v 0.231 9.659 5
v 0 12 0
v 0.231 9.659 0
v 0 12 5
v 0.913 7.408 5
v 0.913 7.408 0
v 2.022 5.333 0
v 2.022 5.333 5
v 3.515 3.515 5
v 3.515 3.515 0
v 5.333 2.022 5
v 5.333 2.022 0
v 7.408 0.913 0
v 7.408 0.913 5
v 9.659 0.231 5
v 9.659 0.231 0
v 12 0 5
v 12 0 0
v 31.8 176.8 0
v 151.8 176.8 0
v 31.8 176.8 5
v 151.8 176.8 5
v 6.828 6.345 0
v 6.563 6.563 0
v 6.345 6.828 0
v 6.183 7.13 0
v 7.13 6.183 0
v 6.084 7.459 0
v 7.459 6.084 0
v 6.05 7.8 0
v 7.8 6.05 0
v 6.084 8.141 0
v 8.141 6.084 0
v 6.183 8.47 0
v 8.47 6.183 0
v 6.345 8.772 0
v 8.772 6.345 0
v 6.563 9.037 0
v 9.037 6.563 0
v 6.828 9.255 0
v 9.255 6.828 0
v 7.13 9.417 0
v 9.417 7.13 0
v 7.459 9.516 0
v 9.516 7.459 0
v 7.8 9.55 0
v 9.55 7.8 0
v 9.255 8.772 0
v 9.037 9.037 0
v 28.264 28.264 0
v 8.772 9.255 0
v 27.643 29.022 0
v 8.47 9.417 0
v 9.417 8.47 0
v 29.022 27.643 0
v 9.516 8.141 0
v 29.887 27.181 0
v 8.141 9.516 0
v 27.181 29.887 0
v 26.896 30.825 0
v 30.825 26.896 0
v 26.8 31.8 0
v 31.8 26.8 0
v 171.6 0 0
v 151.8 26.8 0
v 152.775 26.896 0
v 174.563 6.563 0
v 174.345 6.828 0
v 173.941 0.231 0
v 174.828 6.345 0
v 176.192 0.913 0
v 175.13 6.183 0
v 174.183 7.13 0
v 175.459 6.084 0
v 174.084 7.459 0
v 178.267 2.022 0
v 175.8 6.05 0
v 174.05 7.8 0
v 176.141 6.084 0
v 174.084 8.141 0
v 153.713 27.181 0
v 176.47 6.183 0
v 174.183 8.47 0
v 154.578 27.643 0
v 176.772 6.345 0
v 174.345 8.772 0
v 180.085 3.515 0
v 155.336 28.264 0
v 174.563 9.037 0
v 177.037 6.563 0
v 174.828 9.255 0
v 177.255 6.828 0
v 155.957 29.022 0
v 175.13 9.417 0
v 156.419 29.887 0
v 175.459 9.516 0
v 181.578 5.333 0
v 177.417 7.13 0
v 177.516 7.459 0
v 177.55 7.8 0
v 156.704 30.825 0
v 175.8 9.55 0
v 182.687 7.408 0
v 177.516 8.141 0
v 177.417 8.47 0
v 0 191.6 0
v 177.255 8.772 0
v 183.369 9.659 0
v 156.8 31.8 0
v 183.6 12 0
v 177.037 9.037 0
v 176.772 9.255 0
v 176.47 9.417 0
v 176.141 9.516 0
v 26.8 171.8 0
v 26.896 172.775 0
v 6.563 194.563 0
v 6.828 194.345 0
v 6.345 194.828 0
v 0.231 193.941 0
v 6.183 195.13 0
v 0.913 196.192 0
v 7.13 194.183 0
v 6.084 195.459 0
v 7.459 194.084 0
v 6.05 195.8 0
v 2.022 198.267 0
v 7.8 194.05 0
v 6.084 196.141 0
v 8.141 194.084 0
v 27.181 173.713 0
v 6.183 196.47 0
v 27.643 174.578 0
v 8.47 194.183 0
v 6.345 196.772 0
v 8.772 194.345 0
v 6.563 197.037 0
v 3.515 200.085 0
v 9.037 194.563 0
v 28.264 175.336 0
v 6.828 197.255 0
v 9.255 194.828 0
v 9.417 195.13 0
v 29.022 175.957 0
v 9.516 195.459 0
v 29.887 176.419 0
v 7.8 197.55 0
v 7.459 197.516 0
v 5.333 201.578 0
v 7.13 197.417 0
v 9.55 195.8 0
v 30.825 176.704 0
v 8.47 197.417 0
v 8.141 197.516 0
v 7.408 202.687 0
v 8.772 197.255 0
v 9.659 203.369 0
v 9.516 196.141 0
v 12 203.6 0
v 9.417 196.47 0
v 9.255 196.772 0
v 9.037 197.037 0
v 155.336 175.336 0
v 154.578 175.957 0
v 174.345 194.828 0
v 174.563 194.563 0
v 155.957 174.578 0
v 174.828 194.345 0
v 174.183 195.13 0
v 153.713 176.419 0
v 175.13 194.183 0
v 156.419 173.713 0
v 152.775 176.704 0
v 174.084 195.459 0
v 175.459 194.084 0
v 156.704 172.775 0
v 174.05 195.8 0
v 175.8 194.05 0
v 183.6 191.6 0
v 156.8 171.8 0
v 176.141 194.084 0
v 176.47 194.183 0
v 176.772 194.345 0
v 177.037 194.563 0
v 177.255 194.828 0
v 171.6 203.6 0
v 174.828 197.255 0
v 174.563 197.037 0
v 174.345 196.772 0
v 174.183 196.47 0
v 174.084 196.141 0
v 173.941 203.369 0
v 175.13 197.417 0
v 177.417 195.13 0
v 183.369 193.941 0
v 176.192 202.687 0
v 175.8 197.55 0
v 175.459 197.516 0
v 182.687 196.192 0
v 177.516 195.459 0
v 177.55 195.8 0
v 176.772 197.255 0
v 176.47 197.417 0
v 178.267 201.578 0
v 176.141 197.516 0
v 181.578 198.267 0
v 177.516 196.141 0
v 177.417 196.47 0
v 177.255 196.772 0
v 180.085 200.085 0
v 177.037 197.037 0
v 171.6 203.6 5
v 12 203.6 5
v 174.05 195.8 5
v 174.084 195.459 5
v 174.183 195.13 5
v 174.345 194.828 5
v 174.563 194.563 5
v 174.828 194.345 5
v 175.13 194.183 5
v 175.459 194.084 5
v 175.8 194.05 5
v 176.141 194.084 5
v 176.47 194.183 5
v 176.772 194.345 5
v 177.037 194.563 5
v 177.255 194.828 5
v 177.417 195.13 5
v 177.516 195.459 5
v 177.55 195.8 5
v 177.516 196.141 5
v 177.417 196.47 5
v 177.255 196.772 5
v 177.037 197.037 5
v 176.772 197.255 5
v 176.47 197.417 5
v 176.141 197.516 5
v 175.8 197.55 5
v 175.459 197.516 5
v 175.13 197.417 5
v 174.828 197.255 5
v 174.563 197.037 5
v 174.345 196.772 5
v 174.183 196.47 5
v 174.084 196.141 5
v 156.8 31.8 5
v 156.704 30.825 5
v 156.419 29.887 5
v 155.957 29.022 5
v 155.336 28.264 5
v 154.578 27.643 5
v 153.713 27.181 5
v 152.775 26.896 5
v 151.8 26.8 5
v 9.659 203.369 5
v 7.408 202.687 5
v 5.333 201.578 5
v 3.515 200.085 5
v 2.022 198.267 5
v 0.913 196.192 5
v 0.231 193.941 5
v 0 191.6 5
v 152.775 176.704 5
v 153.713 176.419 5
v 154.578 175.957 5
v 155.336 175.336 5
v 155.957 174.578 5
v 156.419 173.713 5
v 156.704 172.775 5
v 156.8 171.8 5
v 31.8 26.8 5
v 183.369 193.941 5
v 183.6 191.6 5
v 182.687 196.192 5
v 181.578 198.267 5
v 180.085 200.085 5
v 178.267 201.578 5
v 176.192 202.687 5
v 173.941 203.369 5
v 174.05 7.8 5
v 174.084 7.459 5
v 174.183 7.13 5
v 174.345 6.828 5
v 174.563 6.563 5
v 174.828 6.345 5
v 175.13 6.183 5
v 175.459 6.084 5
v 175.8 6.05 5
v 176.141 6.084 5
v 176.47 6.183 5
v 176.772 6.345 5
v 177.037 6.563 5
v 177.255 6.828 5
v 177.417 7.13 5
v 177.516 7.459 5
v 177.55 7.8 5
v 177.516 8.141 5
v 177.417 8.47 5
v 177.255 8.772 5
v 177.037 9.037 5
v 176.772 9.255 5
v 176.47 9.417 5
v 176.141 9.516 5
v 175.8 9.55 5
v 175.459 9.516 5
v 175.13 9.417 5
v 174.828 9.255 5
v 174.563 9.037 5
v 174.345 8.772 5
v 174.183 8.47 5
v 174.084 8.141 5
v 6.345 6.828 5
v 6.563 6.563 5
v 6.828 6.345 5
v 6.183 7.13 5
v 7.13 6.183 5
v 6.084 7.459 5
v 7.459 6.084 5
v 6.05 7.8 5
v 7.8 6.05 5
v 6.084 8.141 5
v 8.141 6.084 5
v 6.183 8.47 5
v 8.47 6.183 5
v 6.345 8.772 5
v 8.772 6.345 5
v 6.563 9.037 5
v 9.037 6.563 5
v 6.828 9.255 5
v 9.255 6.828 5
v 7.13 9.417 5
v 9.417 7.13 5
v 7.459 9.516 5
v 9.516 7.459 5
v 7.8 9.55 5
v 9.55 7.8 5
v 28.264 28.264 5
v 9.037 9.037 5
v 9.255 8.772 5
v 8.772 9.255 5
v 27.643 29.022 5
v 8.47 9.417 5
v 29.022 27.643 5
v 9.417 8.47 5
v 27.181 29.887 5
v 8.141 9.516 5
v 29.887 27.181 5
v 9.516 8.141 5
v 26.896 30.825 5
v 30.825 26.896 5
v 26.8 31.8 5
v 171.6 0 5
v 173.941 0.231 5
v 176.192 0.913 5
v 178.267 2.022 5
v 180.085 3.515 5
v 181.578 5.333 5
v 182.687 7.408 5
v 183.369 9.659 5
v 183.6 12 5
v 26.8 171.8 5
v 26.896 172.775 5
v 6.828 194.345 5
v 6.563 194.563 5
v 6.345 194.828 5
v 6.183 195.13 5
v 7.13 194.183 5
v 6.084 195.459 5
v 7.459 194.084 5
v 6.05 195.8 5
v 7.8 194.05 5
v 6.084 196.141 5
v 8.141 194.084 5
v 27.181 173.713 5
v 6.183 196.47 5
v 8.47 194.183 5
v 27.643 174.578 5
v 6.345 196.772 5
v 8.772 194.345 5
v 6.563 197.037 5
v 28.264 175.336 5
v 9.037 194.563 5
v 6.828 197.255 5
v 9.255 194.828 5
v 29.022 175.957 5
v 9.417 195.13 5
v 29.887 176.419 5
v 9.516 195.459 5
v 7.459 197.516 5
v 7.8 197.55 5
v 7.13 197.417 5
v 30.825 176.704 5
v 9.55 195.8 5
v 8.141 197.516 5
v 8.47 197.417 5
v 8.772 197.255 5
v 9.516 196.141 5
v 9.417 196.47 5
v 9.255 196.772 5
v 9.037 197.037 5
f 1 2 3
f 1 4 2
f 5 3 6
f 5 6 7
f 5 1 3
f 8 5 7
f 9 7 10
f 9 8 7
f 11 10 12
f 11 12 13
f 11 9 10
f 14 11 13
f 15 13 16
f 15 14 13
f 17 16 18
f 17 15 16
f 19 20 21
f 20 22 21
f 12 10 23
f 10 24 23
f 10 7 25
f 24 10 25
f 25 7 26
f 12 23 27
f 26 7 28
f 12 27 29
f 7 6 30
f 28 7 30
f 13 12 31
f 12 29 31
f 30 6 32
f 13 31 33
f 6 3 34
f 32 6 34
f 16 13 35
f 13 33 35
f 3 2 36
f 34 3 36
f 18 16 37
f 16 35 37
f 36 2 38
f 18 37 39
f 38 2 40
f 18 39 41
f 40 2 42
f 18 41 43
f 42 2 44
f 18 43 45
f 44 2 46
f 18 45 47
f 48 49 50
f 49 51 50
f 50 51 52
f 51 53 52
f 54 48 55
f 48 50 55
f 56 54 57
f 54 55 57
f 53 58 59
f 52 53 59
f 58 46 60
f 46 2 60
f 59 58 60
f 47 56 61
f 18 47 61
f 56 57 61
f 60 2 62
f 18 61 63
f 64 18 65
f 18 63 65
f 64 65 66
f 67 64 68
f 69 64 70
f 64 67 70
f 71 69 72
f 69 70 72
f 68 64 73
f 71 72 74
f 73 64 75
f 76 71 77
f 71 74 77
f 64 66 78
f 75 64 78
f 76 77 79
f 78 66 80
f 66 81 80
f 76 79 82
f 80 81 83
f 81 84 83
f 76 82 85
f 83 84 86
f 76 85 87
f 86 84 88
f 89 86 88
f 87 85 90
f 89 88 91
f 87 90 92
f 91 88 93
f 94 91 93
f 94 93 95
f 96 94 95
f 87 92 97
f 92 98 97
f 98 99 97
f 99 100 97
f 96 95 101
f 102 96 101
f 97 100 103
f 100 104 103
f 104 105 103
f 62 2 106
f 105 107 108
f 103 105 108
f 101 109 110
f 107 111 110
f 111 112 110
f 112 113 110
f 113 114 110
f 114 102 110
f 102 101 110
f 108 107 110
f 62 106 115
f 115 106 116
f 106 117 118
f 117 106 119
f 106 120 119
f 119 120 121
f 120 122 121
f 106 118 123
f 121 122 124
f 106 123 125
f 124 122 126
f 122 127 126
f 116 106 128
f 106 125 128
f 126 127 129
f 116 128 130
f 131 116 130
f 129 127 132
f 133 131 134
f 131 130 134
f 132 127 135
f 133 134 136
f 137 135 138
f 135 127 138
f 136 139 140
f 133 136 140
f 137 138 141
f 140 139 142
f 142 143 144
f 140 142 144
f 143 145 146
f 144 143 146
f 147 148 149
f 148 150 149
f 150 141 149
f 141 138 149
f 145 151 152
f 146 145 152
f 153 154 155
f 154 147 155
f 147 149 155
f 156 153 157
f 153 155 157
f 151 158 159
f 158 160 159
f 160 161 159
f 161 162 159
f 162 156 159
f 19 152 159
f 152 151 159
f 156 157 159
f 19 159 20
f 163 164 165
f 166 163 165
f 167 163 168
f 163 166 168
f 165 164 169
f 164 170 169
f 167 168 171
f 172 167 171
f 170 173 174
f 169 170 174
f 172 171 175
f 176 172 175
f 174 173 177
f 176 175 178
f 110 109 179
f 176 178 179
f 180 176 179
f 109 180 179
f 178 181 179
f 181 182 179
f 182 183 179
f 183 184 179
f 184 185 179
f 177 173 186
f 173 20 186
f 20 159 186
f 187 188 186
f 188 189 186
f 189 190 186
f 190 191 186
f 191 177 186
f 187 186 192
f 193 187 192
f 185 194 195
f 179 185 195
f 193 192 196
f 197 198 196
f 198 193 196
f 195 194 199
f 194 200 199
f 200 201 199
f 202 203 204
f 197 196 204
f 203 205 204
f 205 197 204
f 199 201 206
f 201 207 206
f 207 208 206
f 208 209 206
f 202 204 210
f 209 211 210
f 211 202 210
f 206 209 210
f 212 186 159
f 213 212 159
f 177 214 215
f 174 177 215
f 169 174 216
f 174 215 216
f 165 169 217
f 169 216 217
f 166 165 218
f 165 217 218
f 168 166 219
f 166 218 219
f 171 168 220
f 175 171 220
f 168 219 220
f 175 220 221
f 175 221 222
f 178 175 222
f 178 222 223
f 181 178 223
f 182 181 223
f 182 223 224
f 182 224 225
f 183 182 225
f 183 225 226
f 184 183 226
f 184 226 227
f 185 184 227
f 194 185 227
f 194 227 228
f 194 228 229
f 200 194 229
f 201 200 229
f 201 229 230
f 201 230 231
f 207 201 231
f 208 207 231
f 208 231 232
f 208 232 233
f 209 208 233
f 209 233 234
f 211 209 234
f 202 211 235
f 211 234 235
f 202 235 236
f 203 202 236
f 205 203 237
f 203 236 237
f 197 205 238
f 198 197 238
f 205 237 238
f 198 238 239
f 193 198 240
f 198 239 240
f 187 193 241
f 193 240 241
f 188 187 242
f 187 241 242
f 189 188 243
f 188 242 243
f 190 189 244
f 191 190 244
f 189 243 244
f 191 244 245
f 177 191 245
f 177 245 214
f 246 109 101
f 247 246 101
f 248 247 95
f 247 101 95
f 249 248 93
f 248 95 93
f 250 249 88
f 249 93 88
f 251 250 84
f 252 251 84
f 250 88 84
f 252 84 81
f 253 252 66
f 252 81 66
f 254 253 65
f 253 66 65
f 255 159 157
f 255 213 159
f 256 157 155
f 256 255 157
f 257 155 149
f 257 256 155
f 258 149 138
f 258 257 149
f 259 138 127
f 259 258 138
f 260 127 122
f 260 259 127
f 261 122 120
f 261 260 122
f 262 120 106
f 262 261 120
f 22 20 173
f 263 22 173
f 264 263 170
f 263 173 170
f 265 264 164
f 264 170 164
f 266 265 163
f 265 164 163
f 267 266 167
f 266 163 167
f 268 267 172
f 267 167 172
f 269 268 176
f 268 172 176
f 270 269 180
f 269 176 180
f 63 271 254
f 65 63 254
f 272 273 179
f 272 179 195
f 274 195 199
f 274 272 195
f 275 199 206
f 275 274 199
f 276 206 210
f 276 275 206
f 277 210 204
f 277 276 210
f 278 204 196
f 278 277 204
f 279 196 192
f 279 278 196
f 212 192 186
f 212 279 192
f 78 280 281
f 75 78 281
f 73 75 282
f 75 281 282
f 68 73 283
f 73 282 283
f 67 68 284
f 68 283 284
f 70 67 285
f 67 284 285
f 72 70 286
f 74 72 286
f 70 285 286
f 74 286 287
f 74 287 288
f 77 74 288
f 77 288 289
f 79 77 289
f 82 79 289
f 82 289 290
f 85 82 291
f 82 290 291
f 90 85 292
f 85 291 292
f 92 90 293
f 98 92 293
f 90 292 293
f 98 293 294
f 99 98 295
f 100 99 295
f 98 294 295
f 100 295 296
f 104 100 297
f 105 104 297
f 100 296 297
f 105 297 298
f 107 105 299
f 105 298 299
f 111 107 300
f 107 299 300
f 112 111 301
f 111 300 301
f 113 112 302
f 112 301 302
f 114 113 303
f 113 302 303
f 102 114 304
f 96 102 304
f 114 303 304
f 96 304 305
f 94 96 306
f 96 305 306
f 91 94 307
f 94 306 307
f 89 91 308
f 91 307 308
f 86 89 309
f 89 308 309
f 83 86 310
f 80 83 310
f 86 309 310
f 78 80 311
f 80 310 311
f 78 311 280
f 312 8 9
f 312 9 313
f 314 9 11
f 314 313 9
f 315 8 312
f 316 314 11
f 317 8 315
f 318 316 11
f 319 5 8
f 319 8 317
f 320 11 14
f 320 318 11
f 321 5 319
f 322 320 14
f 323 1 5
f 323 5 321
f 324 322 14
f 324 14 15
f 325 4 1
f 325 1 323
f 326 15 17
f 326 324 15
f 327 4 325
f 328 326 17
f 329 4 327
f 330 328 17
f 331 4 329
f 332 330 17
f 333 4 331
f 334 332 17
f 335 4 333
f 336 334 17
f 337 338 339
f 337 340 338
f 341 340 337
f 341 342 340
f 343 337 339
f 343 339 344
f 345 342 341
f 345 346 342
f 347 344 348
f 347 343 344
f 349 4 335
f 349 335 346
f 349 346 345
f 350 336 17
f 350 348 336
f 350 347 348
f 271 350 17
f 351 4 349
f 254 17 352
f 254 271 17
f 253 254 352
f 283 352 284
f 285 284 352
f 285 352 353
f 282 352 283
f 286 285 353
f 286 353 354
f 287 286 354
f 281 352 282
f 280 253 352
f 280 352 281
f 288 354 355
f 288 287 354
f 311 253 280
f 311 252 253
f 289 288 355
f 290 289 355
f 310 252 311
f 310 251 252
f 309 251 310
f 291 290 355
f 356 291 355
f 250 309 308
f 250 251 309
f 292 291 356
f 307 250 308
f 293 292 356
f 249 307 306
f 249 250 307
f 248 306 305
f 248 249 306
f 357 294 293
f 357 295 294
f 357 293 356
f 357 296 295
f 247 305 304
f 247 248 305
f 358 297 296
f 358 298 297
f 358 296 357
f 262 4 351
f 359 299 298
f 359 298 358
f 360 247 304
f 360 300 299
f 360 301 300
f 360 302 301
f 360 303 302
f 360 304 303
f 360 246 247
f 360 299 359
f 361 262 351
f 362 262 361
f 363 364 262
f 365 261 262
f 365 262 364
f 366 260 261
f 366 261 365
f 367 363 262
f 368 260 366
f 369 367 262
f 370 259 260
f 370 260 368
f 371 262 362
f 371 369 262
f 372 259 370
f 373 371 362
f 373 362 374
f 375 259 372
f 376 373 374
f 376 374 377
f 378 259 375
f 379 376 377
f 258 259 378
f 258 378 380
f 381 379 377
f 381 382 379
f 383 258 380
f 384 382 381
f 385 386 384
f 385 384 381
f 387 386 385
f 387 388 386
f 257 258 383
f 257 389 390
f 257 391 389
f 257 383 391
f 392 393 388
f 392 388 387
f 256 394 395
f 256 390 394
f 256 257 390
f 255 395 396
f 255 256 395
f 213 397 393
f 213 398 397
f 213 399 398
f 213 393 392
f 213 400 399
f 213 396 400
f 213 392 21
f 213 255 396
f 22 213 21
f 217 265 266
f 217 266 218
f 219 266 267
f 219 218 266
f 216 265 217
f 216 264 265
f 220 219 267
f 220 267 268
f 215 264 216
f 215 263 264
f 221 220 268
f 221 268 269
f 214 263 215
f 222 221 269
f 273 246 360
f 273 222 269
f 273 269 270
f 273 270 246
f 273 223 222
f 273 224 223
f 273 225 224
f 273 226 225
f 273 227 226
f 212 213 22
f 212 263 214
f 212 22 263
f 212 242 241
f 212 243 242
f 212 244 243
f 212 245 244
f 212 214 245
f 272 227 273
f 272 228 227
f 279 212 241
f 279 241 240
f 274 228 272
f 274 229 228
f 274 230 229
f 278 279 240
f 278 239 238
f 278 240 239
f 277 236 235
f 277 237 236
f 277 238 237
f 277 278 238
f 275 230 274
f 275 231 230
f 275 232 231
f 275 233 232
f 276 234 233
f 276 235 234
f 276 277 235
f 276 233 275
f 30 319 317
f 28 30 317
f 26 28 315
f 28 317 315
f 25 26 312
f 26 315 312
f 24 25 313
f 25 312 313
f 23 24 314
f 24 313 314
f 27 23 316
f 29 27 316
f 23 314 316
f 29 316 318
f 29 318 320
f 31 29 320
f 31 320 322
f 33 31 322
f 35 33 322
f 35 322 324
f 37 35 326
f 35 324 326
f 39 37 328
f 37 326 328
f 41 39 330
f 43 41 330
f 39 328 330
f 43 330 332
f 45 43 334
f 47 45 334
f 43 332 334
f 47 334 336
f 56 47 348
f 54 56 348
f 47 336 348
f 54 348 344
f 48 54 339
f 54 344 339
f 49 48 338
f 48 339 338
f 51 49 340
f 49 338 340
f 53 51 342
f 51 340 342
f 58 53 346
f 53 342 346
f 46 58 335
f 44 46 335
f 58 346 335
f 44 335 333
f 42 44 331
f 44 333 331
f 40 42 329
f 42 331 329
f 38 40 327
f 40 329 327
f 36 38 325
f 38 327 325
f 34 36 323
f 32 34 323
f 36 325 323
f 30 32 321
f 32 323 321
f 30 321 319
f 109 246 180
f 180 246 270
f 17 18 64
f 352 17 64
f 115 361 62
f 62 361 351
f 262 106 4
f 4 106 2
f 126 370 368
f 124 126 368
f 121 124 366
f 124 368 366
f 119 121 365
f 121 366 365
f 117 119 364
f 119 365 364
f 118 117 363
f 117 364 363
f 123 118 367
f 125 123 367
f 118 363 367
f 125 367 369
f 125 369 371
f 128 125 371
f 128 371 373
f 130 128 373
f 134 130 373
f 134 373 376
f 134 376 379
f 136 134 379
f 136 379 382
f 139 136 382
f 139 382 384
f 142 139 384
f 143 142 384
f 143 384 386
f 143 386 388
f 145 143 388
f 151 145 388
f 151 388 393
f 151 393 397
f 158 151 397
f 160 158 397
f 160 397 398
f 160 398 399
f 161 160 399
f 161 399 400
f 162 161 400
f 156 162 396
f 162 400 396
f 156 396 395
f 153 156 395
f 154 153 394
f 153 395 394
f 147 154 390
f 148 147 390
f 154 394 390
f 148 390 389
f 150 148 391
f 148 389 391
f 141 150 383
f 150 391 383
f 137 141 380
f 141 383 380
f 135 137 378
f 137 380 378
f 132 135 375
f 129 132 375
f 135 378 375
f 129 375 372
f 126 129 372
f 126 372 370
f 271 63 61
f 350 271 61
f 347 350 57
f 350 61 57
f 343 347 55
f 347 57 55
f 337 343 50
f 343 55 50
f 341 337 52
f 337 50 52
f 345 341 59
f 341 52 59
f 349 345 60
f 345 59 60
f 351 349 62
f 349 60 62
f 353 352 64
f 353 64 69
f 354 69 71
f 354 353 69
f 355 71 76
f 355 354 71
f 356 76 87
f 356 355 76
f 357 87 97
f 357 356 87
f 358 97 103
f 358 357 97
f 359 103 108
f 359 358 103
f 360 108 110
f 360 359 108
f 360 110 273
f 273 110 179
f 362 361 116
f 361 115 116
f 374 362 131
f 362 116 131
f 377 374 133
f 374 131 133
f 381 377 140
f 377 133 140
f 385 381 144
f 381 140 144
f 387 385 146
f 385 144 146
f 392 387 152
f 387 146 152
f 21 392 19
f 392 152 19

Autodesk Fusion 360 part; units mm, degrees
sketch "Sketch1" plane through (0, 0, 0) normal (0, 0, 1) x (1, 0, 0) in component "Top Cover Plate"
  line L0 (0, 0) -> (183.6, 0)
  line L1 (183.6, 0) -> (183.6, 203.6)
  line L2 (183.6, 203.6) -> (0, 203.6)
  line L3 (0, 203.6) -> (0, 0)
  dimension "d1" = 183.6
  dimension "d2" = 203.6
extrude "Extrude1" add sketch "Sketch1" along normal blind 5 in component "Top Cover Plate"
fillet "Fillet1" radius 12 4 edges at (183.6, 0, 2.5) (0, 0, 2.5) (183.6, 203.6, 2.5) (0, 203.6, 2.5) in component "Top Cover Plate"
sketch "Sketch2" plane through (0, 0, 5) normal (0, 0, 1) x (-1, 0, 0) in component "Top Cover Plate"
  arc A0 (-12, -203.6) -> (0, -191.6) centre (-12, -191.6) ccw
  line L0 (0, -191.6) -> (0, -12)
  arc A1 (0, -12) -> (-12, 0) centre (-12, -12) ccw
  line L1 (-12, 0) -> (-171.6, 0)
  arc A2 (-171.6, 0) -> (-183.6, -12) centre (-171.6, -12) ccw
  line L2 (-183.6, -12) -> (-183.6, -191.6)
  arc A3 (-183.6, -191.6) -> (-171.6, -203.6) centre (-171.6, -191.6) ccw
  line L3 (-171.6, -203.6) -> (-12, -203.6)
  line L4 (0, -195.8) -> (-183.6, -195.8) construction
  line L5 (0, -7.8) -> (-183.6, -7.8) construction
  line L6 (-7.8, -203.6) -> (-7.8, 0) construction
  line L7 (-175.8, -203.6) -> (-175.8, 0) construction
  circle A4 centre (-7.8, -195.8) radius 1.75
  circle A5 centre (-175.8, -195.8) radius 1.75
  circle A6 centre (-7.8, -7.8) radius 1.75
  circle A7 centre (-175.8, -7.8) radius 1.75
  dimension "d7" = 7.8
  dimension "d8" = 7.8
  dimension "d9" = 7.8
  dimension "d10" = 7.8
  dimension "d11" = 3.5
  dimension "d12" = 3.5
  dimension "d13" = 3.5
  dimension "d14" = 3.5
extrude "Extrude2" cut sketch "Sketch2" against normal up to surface (5 mm away) contours A4 | A5 | A6 | A7 in component "Top Cover Plate"
sketch "Sketch3" plane through (0, 0, 5) normal (0, 0, 1) x (-1, 0, 0) in component "Top Cover Plate"
  circle A0 centre (-175.8, -195.8) radius 1.75
  circle A1 centre (-7.8, -7.8) radius 1.75
  circle A2 centre (-7.8, -195.8) radius 1.75
  circle A3 centre (-175.8, -7.8) radius 1.75
  arc A4 (-12, -203.6) -> (0, -191.6) centre (-12, -191.6) ccw
  line L0 (0, -191.6) -> (0, -12)
  arc A5 (0, -12) -> (-12, 0) centre (-12, -12) ccw
  line L1 (-12, 0) -> (-171.6, 0)
  arc A6 (-171.6, 0) -> (-183.6, -12) centre (-171.6, -12) ccw
  line L2 (-183.6, -12) -> (-183.6, -191.6)
  arc A7 (-183.6, -191.6) -> (-171.6, -203.6) centre (-171.6, -191.6) ccw
  line L3 (-171.6, -203.6) -> (-12, -203.6)
  line L4 (-91.8, -203.6) -> (-91.8, 0) construction
  line L5 (0, -101.8) -> (-183.6, -101.8) construction
  line L6 (-156.8, -176.8) -> (-26.8, -176.8)
  line L7 (-26.8, -176.8) -> (-26.8, -26.8)
  line L8 (-26.8, -26.8) -> (-156.8, -26.8)
  line L9 (-156.8, -26.8) -> (-156.8, -176.8)
  line L10 (-156.8, -176.8) -> (-26.8, -26.8) construction
  line L11 (-26.8, -176.8) -> (-156.8, -26.8) construction
  point P0 (-91.8, -101.8)
  dimension "d17" = 130
  dimension "d18" = 150
extrude "Extrude3" cut sketch "Sketch3" against normal up to surface (5 mm away) contours L6 L7 L8 L9 in component "Top Cover Plate"
fillet "Fillet2" radius 5 4 edges at (26.8, 26.8, 2.5) (26.8, 176.8, 2.5) (156.8, 176.8, 2.5) (156.8, 26.8, 2.5) in component "Top Cover Plate"
component "Top Cover Plate" placed x (1, 0, 0) y (0, 1, 0) z (0, 0, 1) at (0, 0, 0)
